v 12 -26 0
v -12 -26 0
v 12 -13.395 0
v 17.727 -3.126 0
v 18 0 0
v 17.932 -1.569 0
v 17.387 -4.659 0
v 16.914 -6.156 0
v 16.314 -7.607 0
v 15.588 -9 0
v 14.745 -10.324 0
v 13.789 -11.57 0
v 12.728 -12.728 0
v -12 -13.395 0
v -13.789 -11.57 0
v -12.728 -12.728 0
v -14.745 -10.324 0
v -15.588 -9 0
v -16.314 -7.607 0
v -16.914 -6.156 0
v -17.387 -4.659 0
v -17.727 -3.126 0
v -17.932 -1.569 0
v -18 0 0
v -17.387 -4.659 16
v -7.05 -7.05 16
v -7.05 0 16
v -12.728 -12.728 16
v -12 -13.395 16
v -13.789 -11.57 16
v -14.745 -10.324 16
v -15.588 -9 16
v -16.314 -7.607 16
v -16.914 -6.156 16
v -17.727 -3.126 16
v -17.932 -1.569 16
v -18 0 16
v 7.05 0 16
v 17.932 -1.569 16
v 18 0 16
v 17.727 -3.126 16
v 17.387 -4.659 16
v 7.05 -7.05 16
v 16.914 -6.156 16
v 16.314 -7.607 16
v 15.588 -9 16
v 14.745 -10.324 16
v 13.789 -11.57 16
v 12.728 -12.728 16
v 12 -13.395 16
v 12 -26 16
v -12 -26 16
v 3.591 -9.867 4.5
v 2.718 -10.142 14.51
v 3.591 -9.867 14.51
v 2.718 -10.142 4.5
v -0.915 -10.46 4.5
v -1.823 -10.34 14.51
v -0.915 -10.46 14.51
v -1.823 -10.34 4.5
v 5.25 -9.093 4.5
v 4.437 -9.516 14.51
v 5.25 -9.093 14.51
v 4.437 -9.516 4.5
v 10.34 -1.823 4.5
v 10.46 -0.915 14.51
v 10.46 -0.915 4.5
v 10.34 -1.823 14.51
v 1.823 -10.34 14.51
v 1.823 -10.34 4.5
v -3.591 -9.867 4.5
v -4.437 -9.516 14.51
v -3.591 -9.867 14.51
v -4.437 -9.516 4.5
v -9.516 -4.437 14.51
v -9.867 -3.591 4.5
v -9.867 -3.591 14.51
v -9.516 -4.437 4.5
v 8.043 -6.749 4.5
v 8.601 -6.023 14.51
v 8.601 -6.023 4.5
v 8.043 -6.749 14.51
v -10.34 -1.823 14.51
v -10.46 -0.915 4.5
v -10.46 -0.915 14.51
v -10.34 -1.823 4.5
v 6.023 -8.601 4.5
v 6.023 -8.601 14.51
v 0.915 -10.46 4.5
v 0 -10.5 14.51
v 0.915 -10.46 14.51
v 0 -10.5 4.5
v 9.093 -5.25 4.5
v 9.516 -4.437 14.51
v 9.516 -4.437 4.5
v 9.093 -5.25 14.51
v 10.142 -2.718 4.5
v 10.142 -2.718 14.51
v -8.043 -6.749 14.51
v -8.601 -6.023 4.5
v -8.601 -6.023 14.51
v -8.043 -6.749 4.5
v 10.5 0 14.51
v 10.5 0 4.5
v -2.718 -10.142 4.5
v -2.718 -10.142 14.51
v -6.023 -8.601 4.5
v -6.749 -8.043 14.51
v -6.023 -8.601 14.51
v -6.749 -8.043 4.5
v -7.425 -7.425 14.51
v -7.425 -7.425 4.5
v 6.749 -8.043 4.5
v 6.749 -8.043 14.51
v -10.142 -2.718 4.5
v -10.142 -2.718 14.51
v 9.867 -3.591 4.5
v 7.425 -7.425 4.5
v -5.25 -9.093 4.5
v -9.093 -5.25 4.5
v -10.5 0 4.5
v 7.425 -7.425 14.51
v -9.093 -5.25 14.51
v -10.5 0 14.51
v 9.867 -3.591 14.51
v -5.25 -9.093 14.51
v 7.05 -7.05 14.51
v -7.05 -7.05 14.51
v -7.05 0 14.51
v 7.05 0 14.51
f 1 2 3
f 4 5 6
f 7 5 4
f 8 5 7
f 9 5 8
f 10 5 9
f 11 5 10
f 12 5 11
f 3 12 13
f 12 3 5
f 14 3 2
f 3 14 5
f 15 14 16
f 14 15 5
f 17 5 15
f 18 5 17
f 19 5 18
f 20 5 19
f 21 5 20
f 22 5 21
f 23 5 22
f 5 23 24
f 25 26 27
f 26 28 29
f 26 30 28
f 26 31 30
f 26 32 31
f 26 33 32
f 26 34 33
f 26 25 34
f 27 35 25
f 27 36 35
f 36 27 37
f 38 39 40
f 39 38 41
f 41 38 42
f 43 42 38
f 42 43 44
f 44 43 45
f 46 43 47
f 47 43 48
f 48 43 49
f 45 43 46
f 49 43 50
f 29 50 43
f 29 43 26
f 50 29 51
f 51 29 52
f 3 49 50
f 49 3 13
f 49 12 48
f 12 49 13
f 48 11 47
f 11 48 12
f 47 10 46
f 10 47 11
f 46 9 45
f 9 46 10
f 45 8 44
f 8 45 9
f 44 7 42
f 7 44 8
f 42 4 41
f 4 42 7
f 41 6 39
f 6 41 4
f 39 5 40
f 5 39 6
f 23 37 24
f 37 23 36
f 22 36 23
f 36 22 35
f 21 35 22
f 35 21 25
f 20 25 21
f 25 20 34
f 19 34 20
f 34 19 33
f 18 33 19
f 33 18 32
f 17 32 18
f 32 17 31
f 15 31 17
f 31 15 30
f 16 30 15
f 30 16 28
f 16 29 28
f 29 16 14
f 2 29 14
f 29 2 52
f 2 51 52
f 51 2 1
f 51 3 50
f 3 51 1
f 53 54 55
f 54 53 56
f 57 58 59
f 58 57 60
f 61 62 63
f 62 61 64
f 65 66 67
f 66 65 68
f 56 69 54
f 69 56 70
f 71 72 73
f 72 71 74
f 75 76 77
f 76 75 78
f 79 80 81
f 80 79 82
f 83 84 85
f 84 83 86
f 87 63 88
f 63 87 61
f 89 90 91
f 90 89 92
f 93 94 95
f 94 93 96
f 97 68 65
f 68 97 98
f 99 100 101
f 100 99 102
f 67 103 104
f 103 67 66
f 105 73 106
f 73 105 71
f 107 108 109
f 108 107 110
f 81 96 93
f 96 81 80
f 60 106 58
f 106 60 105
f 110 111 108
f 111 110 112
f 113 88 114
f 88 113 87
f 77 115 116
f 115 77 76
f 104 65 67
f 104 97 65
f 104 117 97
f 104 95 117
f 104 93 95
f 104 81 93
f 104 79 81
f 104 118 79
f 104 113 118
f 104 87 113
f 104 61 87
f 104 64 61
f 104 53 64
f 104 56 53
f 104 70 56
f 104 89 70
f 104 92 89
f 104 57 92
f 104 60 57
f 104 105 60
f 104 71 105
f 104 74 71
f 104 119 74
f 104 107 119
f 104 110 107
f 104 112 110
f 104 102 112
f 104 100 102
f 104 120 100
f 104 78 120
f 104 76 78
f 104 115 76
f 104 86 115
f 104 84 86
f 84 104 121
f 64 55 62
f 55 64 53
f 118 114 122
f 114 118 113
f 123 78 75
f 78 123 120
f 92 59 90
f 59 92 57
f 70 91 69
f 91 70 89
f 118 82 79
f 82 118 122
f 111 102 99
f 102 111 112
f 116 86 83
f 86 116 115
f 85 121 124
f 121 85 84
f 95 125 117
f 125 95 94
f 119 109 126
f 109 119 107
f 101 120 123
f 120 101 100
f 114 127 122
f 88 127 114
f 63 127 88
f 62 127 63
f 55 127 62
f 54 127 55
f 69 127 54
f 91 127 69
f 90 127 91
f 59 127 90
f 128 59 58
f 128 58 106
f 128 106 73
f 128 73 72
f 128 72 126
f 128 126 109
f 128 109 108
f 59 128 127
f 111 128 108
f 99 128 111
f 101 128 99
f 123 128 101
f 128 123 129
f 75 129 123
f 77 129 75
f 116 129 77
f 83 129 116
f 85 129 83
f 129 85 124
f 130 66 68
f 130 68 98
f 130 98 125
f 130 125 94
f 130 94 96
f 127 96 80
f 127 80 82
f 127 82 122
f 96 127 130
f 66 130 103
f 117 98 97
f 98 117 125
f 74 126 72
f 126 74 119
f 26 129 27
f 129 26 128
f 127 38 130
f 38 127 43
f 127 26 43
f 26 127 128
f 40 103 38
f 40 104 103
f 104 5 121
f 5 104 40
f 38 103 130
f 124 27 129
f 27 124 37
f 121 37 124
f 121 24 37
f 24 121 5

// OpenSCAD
// file: sports_clickers.scad
// Sports-style fidget clicker series -- badminton, basketball, softball
// For Cherry MX-style switches. One-piece SEALED bases (blind switch pocket,
// solid bottom -- no lid). Caps and bases use unique, non-square silhouettes.
//
// part = 1 base_badminton   (racquet-head oval)
// part = 2 base_basketball  (round court key / D)
// part = 3 base_softball    (home-plate pentagon)
// part = 11 cap_badminton   (shuttlecock)
// part = 12 cap_basketball  (seamed ball)
// part = 13 cap_softball    (stitched ball)
// part = 0  showcase
//
// Render: openscad -D part=12 -o cap_basketball.stl sports_clickers.scad

$fn = 72;
part = 0;

/* ---------- shared keycap internals ---------- */
cap_h        = 5;      // plate thickness (sculpt sits on top)
pocket_d     = 15;     // underside clearance for switch housing
pocket_depth = 3.5;
boss_d       = 6.0;    // stem boss diameter
cross_w      = 1.35;   // MX cross slot width  (tune 1.25-1.45)
cross_l      = 4.2;
cross_depth  = 4.3;

/* ---------- shared sealed-base internals ---------- */
base_h          = 16;
plate_t         = 1.5;   // MX plate the switch latches grip
hole            = 14.1;  // MX plate cutout
sw_pocket_d     = 21;    // blind pocket for switch body + pins
sw_pocket_depth = 10;    // bottom (base_h-plate_t-sw_pocket_depth)=4.5mm stays solid

/* ============ KEYCAP CORE (round plate, not square) ============ */
// child(0) = 2D plate outline (themed per sport)
module cap_core() {
    difference() {
        linear_extrude(cap_h) children(0);
        translate([0, 0, -0.01]) linear_extrude(pocket_depth)
            difference() { circle(d = pocket_d); circle(d = boss_d); }
        translate([0, 0, -0.01]) linear_extrude(cross_depth) {
            square([cross_l, cross_w], center = true);
            square([cross_w, cross_l], center = true);
        }
    }
}

/* ============ SEALED BASE CORE ============ */
// child(0) = 2D base outline (themed per sport)
module base_core() {
    difference() {
        linear_extrude(base_h) children(0);
        translate([0, 0, base_h - plate_t - sw_pocket_depth])
            cylinder(d = sw_pocket_d, h = sw_pocket_depth + 0.01);
        translate([0, 0, base_h - plate_t - 1]) linear_extrude(plate_t + 2)
            square(hole, center = true);
    }
}

/* helper: a great-circle seam groove carved into a ball of radius R */
module seam(R, tilt, spin, minor = 0.5) {
    rotate([0, 0, spin]) rotate([tilt, 0, 0])
        rotate_extrude() translate([R, 0]) circle(r = minor);
}

/* =================================================================
   BADMINTON  --  shuttlecock cap + racquet-head base
   ================================================================= */
module cap_badminton() {
    cork_r = 5.2;
    union() {
        cap_core() circle(d = 17);
        translate([0, 0, cap_h]) {
            // rounded cork base
            intersection() {
                translate([0, 0, cork_r - 1.5]) sphere(cork_r);
                translate([0, 0, -1]) cylinder(d = 2 * cork_r + 2, h = cork_r + 2);
            }
            // feather skirt: a flared open cone (truncated), printed point-down cork
            translate([0, 0, cork_r - 1.0])
                difference() {
                    cylinder(r1 = cork_r - 0.6, r2 = 8.6, h = 12);
                    translate([0, 0, 2.2])
                        cylinder(r1 = cork_r - 1.6, r2 = 8.0, h = 12);
                }
            // feather ribs suggested as ridges around the skirt
            for (a = [0:30:359])
                rotate([0, 0, a]) translate([0, 0, cork_r - 0.5])
                    rotate([10, 0, 0]) translate([0, 3.2, 0])
                        scale([0.5, 1, 6]) sphere(0.9);
        }
    }
}

module base_badminton() {           // racquet-head oval, long axis in X
    base_core() scale([1.35, 1.0]) circle(d = 33);
}

/* =================================================================
   BASKETBALL  --  seamed ball cap + round court-key base
   ================================================================= */
module cap_basketball() {
    R = 8.0;
    difference() {
        union() {
            cap_core() circle(d = 17);
            // ball hulled down to the plate so the base overhang starts gently
            hull() {
                translate([0, 0, cap_h + R + 1.5]) sphere(R);
                translate([0, 0, cap_h + 0.5]) cylinder(d = 9, h = 0.5);
            }
        }
        // classic seams: equator + two perpendicular verticals
        translate([0, 0, cap_h + R + 1.5]) {
            seam(R, 0,  0);     // equator (XY plane)
            seam(R, 90, 0);     // vertical (XZ plane)
            seam(R, 90, 90);    // vertical (YZ plane)
        }
    }
}

module base_basketball() {          // "key/D": circle with a flat-topped arc mouth
    base_core()
        intersection() {
            union() { circle(d = 36); translate([0, -13]) square([24, 26], center = true); }
            translate([-30, -30]) square([60, 47]);   // flatten the top edge
        }
}

/* =================================================================
   SOFTBALL  --  stitched ball cap + home-plate base
   ================================================================= */
module cap_softball() {
    R  = 8.0;
    x0 = 3.0;                       // left/right offset of each seam ring
    A  = sqrt(R * R - x0 * x0);     // ring radius so the seam sits ON the surface
    cz = cap_h + R + 1.5;           // ball centre height
    difference() {
        union() {
            cap_core() circle(d = 17);
            hull() {
                translate([0, 0, cz]) sphere(R);
                translate([0, 0, cap_h + 0.5]) cylinder(d = 9, h = 0.5);
            }
        }
        // two classic softball seams: rings in the YZ plane, offset +/-x0,
        // sitting exactly on the sphere surface so the groove is visible.
        translate([0, 0, cz])
            for (m = [-1, 1])
                translate([m * x0, 0, 0]) rotate([0, 90, 0])
                    rotate_extrude() translate([A, 0]) circle(r = 0.5);
    }
    // raised stitch dashes lying flat along both seams (long axis = seam tangent)
    translate([0, 0, cz])
        for (m = [-1, 1])
            for (a = [0 : 16 : 359])
                translate([m * x0, A * cos(a), A * sin(a)])
                    rotate([a, 0, 0]) scale([0.5, 0.55, 1.5]) sphere(0.5);
}

module base_softball() {            // home-plate pentagon, point toward -Y
    base_core()
        polygon([[-15, 8], [15, 8], [15, -6], [0, -17], [-15, -6]]);
}

/* ============================ OUTPUT ============================ */
if      (part == 1)  base_badminton();
else if (part == 2)  base_basketball();
else if (part == 3)  base_softball();
else if (part == 11) cap_badminton();
else if (part == 12) cap_basketball();
else if (part == 13) cap_softball();
else {  // showcase
    translate([0,   0, 0]) base_badminton();
    translate([55,  0, 0]) base_basketball();
    translate([110, 0, 0]) base_softball();
    translate([0,   -45, 0]) cap_badminton();
    translate([55,  -45, 0]) cap_basketball();
    translate([110, -45, 0]) cap_softball();
}
// main file
use <sports_clickers.scad>
difference(){ base_basketball(); translate([-50,0,-5]) cube([100,50,60]); }
